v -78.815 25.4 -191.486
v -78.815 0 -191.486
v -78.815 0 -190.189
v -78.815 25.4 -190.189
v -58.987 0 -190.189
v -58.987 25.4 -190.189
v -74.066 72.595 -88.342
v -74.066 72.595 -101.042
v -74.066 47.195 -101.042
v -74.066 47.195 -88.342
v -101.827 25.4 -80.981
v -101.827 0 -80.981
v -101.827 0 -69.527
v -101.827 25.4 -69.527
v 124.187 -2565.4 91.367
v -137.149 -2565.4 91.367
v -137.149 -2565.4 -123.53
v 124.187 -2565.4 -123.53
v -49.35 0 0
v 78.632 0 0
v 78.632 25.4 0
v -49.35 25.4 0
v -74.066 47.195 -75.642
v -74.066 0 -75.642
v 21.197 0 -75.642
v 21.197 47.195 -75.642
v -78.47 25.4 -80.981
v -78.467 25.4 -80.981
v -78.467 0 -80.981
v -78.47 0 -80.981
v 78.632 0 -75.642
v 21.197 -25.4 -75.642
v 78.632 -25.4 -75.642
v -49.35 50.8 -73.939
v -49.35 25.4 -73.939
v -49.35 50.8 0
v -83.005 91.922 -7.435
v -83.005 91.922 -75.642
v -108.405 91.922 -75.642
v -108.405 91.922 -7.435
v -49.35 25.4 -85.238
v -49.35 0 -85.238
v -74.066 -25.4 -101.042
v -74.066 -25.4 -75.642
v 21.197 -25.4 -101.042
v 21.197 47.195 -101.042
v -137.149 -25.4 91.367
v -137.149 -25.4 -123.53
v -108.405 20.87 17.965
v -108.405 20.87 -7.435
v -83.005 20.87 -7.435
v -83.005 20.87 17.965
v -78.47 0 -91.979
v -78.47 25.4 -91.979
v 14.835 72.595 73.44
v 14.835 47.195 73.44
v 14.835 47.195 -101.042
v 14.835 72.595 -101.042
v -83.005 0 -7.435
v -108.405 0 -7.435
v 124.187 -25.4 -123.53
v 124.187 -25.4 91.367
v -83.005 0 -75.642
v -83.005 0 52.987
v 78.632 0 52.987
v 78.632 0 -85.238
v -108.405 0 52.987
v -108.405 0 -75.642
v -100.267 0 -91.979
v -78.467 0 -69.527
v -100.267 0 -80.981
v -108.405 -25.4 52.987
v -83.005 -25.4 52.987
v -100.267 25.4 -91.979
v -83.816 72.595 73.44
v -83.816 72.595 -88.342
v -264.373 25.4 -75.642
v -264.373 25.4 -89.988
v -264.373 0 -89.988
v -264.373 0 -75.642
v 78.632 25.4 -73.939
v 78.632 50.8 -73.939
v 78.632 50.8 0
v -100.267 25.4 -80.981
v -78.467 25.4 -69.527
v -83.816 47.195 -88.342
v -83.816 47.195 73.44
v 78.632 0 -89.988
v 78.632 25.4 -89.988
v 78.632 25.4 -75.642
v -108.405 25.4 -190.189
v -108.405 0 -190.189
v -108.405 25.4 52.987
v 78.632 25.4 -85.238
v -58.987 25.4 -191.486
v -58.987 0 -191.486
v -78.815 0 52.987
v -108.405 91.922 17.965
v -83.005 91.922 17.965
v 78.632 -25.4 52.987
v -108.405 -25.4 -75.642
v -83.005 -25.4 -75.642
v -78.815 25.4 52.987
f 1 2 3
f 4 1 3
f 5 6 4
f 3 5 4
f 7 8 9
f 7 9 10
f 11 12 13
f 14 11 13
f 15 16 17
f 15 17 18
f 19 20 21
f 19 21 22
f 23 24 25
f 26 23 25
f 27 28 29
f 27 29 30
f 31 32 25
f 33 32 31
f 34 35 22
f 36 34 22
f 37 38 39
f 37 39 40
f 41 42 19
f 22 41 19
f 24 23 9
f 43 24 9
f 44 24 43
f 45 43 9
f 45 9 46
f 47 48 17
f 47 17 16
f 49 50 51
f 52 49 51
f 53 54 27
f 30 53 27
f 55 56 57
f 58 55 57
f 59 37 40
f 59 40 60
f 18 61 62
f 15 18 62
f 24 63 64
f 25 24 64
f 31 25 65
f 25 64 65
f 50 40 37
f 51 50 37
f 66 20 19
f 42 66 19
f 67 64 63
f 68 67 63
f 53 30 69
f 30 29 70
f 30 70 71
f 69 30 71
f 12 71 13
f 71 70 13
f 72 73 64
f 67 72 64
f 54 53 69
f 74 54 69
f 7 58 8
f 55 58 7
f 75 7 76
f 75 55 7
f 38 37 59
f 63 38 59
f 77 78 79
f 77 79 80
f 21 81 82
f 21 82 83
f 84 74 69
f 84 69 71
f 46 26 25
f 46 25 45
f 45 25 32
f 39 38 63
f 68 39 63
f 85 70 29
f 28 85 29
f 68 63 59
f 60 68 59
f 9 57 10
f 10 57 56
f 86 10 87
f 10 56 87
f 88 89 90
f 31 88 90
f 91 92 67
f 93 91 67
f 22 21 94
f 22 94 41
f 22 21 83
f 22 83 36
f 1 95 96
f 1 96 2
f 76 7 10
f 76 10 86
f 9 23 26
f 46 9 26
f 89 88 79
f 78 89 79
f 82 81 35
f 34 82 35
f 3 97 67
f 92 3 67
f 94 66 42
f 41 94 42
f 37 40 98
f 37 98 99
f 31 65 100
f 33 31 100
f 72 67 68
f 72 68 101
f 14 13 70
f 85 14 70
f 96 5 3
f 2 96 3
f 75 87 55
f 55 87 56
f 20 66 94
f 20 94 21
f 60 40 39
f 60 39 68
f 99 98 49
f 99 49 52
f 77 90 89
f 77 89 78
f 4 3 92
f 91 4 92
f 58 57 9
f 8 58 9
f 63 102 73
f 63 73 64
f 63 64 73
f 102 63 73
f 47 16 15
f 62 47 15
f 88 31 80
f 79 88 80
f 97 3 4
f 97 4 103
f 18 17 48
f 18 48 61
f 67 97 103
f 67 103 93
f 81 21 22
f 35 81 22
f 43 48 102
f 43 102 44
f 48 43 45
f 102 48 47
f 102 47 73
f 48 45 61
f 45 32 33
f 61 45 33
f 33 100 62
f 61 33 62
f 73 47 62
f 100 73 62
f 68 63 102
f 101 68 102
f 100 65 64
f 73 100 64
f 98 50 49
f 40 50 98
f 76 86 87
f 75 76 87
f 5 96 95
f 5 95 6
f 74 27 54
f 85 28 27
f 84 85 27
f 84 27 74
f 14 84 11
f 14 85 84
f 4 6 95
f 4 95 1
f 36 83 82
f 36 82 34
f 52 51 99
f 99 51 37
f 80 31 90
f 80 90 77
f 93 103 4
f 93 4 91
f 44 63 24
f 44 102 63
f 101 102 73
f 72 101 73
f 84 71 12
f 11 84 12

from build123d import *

# Parameters (mm, degrees)
F0_W      = 78.6321908236
F0_H      = 50.2420589328
F0_W_2    = 83.0053240061
F1_DEPTH  = 25.4
F2_W      = 26.6048051417
F2_H      = 12.7
F2_W_2    = 1.4717131853
F2_H_2    = 25.4
F3_DEPTH  = 25.4
F4_W      = 261.3360136747
F4_H      = 214.8963138461
F5_DEPTH  = 2540
F6_W      = 91.9215381145
F6_H      = 68.2068861365
F7_DEPTH  = 25.4
F8_W      = 18.1767717004
F8_H      = 111.8716299534
F8_H_2    = 16.7573786616
F9_DEPTH  = 25.4
F10_W     = 19.8279470205
F10_H     = 1.2968182564
F11_DEPTH = 25.4
F10_W_2   = 29.5902959347
F10_H_2   = 243.1764304638
F12_W     = 25.4
F12_H     = 71.0515528917
F13_DEPTH = 25.4
F14_W     = 21.7962116003
F14_H     = 10.9980255365
F15_DEPTH = 25.4
F16_W     = 95.2623337507
F16_H     = 72.595404768
F17_DEPTH = 25.4
F18_W     = 88.901007548
F18_H     = 12.7
F19_DEPTH = 25.4
F20_W     = 343.005374074
F20_H     = 14.3458449006
F21_DEPTH = 25.4
F22_W     = 127.9820352793
F22_H     = 85.2384865284
F23_DEPTH = 25.4
F24_W     = 127.9820352793
F24_H     = 73.9392116666
F25_DEPTH = 25.4


with BuildPart() as f1:
    # F0 (on Front) → F1 (new body)
    with BuildSketch(Plane.XZ):
        Polygon((-83.0053240061, 0), (0, 0), (78.6321908236, 0), (78.6321908236, 52.9869496822), (-83.0053240061, 52.9869496822), align=None)
        with Locations((39.3160954118, -25.1210294664)):
            Rectangle(F0_W, F0_H)
        with Locations((-41.502662003, -25.1210294664)):
            Rectangle(F0_W_2, F0_H)
    extrude(amount=F1_DEPTH)

    # F2 (on face) → F3 (join)
    with BuildSketch(Plane(origin=(0, 0, -50.2420589328), x_dir=(1, 0, 0), z_dir=(0, 0, -1))):
        Polygon((78.6321908236, 25.7508095026), (-56.4005188644, 25.7508095026), (-56.4005188644, 25.4), (77.1604776382, 25.4), (78.6321908236, 25.4), align=None)
        Polygon((77.1604776382, 25.4), (-56.4005188644, 25.4), (-56.4005188644, 12.7), (-56.4005188644, 0), (77.1604776382, 0), align=None)
        with Locations((-69.7029214352, 19.05)):
            Rectangle(F2_W, F2_H)
        with Locations((77.8963342309, 12.7)):
            Rectangle(F2_W_2, F2_H_2)
        with Locations((-69.7029214352, 6.35)):
            Rectangle(F2_W, F2_H)
    extrude(amount=F3_DEPTH)

    # F4 (on face) → F5 (join)
    with BuildSketch(Plane.XZ.offset(25.4)):
        with Locations((-6.4808502793, -16.0813815892)):
            Rectangle(F4_W, F4_H)
    extrude(amount=F5_DEPTH)

    # F16 (on face) → F17 (join)
    with BuildSketch(Plane(origin=(0, 0, -75.6420589328), x_dir=(1, 0, 0), z_dir=(0, 0, -1))):
        with Locations((-26.4344289899, -10.897702384)):
            Rectangle(F16_W, F16_H)
    extrude(amount=F17_DEPTH)


with BuildPart() as f7:
    # F6 (on face) → F7 (new body)
    with BuildSketch(Plane(origin=(-83.0053240061, 0, 0), x_dir=(0, -1, 0), z_dir=(-1, 0, 0))):
        with Locations((-45.9607690573, -41.5386158645)):
            Rectangle(F6_W, F6_H)
    extrude(amount=F7_DEPTH)


with BuildPart() as f9:
    # F8 (on face) → F9 (new body)
    with BuildSketch(Plane(origin=(-83.0053240061, 0, 0), x_dir=(0, -1, 0), z_dir=(-1, 0, 0))):
        with Locations((9.0883858502, -2.9488652945)):
            Rectangle(F8_W, F8_H)
        with Locations((9.0883858502, -67.263369602)):
            Rectangle(F8_W, F8_H_2)
        Polygon((18.1767717004, 52.9869496822), (18.1767717004, -58.8846802711), (18.1767717004, -75.6420589328), (25.4, -75.6420589328), (25.4, 52.9869496822), align=None)
    extrude(amount=F9_DEPTH)


with BuildPart() as f11:
    # F10 (on face) → F11 (new body)
    with BuildSketch(Plane(origin=(0, 0, 0), x_dir=(-1, 0, 0), z_dir=(0, 1, 0))):
        with Locations((68.9010545611, -190.8378899097)):
            Rectangle(F10_W, F10_H)
    extrude(amount=F11_DEPTH)


with BuildPart() as f11b:
    # F10 (on face) → F11, piece 2 (new body)
    with BuildSketch(Plane(origin=(0, 0, 0), x_dir=(-1, 0, 0), z_dir=(0, 1, 0))):
        with Locations((93.6101760387, -68.6012655497)):
            Rectangle(F10_W_2, F10_H_2)
    extrude(amount=F11_DEPTH)


with BuildPart() as f13:
    # F12 (on face) → F13 (new body)
    with BuildSketch(Plane.XY.offset(-7.4351727962)):
        with Locations((-95.7053240061, 56.3957616687)):
            Rectangle(F12_W, F12_H)
    extrude(amount=F13_DEPTH)


with BuildPart() as f15:
    # F14 (on face) → F15 (new body)
    with BuildSketch(Plane(origin=(0, 0, 0), x_dir=(-1, 0, 0), z_dir=(0, 1, 0))):
        Polygon((78.4667208791, -69.5268400013), (78.4667208791, -80.9810757637), (78.4703195095, -80.9810757637), (100.2665311098, -80.9810757637), (101.8273606896, -80.9810757637), (101.8273606896, -69.5268400013), align=None)
        with Locations((89.3684253097, -86.480088532)):
            Rectangle(F14_W, F14_H)
    extrude(amount=F15_DEPTH)


with BuildPart() as f19:
    # F18 (on face) → F19 (new body)
    with BuildSketch(Plane(origin=(0, 47.195404768, 0), x_dir=(-1, 0, 0), z_dir=(0, 1, 0))):
        with Locations((29.6150920913, -94.6920589328)):
            Rectangle(F18_W, F18_H)
        Polygon((-14.8354116827, -88.3420589328), (74.0655958652, -88.3420589328), (83.8160216808, -88.3420589328), (83.8160216808, 73.4404921532), (-14.8354116827, 73.4404921532), align=None)
    extrude(amount=F19_DEPTH)


with BuildPart() as f21:
    # F20 (on face) → F21 (new body)
    with BuildSketch(Plane(origin=(0, 0, 0), x_dir=(-1, 0, 0), z_dir=(0, 1, 0))):
        with Locations((92.8704962134, -82.8149813831)):
            Rectangle(F20_W, F20_H)
    extrude(amount=F21_DEPTH)


with BuildPart() as f23:
    # F22 (on face) → F23 (new body)
    with BuildSketch(Plane(origin=(0, 0, 0), x_dir=(-1, 0, 0), z_dir=(0, 1, 0))):
        with Locations((-14.6411731839, -42.6192432642)):
            Rectangle(F22_W, F22_H)
    extrude(amount=F23_DEPTH)


with BuildPart() as f25:
    # F24 (on face) → F25 (new body)
    with BuildSketch(Plane(origin=(0, 25.4, 0), x_dir=(-1, 0, 0), z_dir=(0, 1, 0))):
        with Locations((-14.6411731839, -36.9696058333)):
            Rectangle(F24_W, F24_H)
    extrude(amount=F25_DEPTH)


solid = Compound([f1.part, f7.part, f9.part, f11.part, f11b.part, f13.part, f15.part, f19.part, f21.part, f23.part, f25.part])
